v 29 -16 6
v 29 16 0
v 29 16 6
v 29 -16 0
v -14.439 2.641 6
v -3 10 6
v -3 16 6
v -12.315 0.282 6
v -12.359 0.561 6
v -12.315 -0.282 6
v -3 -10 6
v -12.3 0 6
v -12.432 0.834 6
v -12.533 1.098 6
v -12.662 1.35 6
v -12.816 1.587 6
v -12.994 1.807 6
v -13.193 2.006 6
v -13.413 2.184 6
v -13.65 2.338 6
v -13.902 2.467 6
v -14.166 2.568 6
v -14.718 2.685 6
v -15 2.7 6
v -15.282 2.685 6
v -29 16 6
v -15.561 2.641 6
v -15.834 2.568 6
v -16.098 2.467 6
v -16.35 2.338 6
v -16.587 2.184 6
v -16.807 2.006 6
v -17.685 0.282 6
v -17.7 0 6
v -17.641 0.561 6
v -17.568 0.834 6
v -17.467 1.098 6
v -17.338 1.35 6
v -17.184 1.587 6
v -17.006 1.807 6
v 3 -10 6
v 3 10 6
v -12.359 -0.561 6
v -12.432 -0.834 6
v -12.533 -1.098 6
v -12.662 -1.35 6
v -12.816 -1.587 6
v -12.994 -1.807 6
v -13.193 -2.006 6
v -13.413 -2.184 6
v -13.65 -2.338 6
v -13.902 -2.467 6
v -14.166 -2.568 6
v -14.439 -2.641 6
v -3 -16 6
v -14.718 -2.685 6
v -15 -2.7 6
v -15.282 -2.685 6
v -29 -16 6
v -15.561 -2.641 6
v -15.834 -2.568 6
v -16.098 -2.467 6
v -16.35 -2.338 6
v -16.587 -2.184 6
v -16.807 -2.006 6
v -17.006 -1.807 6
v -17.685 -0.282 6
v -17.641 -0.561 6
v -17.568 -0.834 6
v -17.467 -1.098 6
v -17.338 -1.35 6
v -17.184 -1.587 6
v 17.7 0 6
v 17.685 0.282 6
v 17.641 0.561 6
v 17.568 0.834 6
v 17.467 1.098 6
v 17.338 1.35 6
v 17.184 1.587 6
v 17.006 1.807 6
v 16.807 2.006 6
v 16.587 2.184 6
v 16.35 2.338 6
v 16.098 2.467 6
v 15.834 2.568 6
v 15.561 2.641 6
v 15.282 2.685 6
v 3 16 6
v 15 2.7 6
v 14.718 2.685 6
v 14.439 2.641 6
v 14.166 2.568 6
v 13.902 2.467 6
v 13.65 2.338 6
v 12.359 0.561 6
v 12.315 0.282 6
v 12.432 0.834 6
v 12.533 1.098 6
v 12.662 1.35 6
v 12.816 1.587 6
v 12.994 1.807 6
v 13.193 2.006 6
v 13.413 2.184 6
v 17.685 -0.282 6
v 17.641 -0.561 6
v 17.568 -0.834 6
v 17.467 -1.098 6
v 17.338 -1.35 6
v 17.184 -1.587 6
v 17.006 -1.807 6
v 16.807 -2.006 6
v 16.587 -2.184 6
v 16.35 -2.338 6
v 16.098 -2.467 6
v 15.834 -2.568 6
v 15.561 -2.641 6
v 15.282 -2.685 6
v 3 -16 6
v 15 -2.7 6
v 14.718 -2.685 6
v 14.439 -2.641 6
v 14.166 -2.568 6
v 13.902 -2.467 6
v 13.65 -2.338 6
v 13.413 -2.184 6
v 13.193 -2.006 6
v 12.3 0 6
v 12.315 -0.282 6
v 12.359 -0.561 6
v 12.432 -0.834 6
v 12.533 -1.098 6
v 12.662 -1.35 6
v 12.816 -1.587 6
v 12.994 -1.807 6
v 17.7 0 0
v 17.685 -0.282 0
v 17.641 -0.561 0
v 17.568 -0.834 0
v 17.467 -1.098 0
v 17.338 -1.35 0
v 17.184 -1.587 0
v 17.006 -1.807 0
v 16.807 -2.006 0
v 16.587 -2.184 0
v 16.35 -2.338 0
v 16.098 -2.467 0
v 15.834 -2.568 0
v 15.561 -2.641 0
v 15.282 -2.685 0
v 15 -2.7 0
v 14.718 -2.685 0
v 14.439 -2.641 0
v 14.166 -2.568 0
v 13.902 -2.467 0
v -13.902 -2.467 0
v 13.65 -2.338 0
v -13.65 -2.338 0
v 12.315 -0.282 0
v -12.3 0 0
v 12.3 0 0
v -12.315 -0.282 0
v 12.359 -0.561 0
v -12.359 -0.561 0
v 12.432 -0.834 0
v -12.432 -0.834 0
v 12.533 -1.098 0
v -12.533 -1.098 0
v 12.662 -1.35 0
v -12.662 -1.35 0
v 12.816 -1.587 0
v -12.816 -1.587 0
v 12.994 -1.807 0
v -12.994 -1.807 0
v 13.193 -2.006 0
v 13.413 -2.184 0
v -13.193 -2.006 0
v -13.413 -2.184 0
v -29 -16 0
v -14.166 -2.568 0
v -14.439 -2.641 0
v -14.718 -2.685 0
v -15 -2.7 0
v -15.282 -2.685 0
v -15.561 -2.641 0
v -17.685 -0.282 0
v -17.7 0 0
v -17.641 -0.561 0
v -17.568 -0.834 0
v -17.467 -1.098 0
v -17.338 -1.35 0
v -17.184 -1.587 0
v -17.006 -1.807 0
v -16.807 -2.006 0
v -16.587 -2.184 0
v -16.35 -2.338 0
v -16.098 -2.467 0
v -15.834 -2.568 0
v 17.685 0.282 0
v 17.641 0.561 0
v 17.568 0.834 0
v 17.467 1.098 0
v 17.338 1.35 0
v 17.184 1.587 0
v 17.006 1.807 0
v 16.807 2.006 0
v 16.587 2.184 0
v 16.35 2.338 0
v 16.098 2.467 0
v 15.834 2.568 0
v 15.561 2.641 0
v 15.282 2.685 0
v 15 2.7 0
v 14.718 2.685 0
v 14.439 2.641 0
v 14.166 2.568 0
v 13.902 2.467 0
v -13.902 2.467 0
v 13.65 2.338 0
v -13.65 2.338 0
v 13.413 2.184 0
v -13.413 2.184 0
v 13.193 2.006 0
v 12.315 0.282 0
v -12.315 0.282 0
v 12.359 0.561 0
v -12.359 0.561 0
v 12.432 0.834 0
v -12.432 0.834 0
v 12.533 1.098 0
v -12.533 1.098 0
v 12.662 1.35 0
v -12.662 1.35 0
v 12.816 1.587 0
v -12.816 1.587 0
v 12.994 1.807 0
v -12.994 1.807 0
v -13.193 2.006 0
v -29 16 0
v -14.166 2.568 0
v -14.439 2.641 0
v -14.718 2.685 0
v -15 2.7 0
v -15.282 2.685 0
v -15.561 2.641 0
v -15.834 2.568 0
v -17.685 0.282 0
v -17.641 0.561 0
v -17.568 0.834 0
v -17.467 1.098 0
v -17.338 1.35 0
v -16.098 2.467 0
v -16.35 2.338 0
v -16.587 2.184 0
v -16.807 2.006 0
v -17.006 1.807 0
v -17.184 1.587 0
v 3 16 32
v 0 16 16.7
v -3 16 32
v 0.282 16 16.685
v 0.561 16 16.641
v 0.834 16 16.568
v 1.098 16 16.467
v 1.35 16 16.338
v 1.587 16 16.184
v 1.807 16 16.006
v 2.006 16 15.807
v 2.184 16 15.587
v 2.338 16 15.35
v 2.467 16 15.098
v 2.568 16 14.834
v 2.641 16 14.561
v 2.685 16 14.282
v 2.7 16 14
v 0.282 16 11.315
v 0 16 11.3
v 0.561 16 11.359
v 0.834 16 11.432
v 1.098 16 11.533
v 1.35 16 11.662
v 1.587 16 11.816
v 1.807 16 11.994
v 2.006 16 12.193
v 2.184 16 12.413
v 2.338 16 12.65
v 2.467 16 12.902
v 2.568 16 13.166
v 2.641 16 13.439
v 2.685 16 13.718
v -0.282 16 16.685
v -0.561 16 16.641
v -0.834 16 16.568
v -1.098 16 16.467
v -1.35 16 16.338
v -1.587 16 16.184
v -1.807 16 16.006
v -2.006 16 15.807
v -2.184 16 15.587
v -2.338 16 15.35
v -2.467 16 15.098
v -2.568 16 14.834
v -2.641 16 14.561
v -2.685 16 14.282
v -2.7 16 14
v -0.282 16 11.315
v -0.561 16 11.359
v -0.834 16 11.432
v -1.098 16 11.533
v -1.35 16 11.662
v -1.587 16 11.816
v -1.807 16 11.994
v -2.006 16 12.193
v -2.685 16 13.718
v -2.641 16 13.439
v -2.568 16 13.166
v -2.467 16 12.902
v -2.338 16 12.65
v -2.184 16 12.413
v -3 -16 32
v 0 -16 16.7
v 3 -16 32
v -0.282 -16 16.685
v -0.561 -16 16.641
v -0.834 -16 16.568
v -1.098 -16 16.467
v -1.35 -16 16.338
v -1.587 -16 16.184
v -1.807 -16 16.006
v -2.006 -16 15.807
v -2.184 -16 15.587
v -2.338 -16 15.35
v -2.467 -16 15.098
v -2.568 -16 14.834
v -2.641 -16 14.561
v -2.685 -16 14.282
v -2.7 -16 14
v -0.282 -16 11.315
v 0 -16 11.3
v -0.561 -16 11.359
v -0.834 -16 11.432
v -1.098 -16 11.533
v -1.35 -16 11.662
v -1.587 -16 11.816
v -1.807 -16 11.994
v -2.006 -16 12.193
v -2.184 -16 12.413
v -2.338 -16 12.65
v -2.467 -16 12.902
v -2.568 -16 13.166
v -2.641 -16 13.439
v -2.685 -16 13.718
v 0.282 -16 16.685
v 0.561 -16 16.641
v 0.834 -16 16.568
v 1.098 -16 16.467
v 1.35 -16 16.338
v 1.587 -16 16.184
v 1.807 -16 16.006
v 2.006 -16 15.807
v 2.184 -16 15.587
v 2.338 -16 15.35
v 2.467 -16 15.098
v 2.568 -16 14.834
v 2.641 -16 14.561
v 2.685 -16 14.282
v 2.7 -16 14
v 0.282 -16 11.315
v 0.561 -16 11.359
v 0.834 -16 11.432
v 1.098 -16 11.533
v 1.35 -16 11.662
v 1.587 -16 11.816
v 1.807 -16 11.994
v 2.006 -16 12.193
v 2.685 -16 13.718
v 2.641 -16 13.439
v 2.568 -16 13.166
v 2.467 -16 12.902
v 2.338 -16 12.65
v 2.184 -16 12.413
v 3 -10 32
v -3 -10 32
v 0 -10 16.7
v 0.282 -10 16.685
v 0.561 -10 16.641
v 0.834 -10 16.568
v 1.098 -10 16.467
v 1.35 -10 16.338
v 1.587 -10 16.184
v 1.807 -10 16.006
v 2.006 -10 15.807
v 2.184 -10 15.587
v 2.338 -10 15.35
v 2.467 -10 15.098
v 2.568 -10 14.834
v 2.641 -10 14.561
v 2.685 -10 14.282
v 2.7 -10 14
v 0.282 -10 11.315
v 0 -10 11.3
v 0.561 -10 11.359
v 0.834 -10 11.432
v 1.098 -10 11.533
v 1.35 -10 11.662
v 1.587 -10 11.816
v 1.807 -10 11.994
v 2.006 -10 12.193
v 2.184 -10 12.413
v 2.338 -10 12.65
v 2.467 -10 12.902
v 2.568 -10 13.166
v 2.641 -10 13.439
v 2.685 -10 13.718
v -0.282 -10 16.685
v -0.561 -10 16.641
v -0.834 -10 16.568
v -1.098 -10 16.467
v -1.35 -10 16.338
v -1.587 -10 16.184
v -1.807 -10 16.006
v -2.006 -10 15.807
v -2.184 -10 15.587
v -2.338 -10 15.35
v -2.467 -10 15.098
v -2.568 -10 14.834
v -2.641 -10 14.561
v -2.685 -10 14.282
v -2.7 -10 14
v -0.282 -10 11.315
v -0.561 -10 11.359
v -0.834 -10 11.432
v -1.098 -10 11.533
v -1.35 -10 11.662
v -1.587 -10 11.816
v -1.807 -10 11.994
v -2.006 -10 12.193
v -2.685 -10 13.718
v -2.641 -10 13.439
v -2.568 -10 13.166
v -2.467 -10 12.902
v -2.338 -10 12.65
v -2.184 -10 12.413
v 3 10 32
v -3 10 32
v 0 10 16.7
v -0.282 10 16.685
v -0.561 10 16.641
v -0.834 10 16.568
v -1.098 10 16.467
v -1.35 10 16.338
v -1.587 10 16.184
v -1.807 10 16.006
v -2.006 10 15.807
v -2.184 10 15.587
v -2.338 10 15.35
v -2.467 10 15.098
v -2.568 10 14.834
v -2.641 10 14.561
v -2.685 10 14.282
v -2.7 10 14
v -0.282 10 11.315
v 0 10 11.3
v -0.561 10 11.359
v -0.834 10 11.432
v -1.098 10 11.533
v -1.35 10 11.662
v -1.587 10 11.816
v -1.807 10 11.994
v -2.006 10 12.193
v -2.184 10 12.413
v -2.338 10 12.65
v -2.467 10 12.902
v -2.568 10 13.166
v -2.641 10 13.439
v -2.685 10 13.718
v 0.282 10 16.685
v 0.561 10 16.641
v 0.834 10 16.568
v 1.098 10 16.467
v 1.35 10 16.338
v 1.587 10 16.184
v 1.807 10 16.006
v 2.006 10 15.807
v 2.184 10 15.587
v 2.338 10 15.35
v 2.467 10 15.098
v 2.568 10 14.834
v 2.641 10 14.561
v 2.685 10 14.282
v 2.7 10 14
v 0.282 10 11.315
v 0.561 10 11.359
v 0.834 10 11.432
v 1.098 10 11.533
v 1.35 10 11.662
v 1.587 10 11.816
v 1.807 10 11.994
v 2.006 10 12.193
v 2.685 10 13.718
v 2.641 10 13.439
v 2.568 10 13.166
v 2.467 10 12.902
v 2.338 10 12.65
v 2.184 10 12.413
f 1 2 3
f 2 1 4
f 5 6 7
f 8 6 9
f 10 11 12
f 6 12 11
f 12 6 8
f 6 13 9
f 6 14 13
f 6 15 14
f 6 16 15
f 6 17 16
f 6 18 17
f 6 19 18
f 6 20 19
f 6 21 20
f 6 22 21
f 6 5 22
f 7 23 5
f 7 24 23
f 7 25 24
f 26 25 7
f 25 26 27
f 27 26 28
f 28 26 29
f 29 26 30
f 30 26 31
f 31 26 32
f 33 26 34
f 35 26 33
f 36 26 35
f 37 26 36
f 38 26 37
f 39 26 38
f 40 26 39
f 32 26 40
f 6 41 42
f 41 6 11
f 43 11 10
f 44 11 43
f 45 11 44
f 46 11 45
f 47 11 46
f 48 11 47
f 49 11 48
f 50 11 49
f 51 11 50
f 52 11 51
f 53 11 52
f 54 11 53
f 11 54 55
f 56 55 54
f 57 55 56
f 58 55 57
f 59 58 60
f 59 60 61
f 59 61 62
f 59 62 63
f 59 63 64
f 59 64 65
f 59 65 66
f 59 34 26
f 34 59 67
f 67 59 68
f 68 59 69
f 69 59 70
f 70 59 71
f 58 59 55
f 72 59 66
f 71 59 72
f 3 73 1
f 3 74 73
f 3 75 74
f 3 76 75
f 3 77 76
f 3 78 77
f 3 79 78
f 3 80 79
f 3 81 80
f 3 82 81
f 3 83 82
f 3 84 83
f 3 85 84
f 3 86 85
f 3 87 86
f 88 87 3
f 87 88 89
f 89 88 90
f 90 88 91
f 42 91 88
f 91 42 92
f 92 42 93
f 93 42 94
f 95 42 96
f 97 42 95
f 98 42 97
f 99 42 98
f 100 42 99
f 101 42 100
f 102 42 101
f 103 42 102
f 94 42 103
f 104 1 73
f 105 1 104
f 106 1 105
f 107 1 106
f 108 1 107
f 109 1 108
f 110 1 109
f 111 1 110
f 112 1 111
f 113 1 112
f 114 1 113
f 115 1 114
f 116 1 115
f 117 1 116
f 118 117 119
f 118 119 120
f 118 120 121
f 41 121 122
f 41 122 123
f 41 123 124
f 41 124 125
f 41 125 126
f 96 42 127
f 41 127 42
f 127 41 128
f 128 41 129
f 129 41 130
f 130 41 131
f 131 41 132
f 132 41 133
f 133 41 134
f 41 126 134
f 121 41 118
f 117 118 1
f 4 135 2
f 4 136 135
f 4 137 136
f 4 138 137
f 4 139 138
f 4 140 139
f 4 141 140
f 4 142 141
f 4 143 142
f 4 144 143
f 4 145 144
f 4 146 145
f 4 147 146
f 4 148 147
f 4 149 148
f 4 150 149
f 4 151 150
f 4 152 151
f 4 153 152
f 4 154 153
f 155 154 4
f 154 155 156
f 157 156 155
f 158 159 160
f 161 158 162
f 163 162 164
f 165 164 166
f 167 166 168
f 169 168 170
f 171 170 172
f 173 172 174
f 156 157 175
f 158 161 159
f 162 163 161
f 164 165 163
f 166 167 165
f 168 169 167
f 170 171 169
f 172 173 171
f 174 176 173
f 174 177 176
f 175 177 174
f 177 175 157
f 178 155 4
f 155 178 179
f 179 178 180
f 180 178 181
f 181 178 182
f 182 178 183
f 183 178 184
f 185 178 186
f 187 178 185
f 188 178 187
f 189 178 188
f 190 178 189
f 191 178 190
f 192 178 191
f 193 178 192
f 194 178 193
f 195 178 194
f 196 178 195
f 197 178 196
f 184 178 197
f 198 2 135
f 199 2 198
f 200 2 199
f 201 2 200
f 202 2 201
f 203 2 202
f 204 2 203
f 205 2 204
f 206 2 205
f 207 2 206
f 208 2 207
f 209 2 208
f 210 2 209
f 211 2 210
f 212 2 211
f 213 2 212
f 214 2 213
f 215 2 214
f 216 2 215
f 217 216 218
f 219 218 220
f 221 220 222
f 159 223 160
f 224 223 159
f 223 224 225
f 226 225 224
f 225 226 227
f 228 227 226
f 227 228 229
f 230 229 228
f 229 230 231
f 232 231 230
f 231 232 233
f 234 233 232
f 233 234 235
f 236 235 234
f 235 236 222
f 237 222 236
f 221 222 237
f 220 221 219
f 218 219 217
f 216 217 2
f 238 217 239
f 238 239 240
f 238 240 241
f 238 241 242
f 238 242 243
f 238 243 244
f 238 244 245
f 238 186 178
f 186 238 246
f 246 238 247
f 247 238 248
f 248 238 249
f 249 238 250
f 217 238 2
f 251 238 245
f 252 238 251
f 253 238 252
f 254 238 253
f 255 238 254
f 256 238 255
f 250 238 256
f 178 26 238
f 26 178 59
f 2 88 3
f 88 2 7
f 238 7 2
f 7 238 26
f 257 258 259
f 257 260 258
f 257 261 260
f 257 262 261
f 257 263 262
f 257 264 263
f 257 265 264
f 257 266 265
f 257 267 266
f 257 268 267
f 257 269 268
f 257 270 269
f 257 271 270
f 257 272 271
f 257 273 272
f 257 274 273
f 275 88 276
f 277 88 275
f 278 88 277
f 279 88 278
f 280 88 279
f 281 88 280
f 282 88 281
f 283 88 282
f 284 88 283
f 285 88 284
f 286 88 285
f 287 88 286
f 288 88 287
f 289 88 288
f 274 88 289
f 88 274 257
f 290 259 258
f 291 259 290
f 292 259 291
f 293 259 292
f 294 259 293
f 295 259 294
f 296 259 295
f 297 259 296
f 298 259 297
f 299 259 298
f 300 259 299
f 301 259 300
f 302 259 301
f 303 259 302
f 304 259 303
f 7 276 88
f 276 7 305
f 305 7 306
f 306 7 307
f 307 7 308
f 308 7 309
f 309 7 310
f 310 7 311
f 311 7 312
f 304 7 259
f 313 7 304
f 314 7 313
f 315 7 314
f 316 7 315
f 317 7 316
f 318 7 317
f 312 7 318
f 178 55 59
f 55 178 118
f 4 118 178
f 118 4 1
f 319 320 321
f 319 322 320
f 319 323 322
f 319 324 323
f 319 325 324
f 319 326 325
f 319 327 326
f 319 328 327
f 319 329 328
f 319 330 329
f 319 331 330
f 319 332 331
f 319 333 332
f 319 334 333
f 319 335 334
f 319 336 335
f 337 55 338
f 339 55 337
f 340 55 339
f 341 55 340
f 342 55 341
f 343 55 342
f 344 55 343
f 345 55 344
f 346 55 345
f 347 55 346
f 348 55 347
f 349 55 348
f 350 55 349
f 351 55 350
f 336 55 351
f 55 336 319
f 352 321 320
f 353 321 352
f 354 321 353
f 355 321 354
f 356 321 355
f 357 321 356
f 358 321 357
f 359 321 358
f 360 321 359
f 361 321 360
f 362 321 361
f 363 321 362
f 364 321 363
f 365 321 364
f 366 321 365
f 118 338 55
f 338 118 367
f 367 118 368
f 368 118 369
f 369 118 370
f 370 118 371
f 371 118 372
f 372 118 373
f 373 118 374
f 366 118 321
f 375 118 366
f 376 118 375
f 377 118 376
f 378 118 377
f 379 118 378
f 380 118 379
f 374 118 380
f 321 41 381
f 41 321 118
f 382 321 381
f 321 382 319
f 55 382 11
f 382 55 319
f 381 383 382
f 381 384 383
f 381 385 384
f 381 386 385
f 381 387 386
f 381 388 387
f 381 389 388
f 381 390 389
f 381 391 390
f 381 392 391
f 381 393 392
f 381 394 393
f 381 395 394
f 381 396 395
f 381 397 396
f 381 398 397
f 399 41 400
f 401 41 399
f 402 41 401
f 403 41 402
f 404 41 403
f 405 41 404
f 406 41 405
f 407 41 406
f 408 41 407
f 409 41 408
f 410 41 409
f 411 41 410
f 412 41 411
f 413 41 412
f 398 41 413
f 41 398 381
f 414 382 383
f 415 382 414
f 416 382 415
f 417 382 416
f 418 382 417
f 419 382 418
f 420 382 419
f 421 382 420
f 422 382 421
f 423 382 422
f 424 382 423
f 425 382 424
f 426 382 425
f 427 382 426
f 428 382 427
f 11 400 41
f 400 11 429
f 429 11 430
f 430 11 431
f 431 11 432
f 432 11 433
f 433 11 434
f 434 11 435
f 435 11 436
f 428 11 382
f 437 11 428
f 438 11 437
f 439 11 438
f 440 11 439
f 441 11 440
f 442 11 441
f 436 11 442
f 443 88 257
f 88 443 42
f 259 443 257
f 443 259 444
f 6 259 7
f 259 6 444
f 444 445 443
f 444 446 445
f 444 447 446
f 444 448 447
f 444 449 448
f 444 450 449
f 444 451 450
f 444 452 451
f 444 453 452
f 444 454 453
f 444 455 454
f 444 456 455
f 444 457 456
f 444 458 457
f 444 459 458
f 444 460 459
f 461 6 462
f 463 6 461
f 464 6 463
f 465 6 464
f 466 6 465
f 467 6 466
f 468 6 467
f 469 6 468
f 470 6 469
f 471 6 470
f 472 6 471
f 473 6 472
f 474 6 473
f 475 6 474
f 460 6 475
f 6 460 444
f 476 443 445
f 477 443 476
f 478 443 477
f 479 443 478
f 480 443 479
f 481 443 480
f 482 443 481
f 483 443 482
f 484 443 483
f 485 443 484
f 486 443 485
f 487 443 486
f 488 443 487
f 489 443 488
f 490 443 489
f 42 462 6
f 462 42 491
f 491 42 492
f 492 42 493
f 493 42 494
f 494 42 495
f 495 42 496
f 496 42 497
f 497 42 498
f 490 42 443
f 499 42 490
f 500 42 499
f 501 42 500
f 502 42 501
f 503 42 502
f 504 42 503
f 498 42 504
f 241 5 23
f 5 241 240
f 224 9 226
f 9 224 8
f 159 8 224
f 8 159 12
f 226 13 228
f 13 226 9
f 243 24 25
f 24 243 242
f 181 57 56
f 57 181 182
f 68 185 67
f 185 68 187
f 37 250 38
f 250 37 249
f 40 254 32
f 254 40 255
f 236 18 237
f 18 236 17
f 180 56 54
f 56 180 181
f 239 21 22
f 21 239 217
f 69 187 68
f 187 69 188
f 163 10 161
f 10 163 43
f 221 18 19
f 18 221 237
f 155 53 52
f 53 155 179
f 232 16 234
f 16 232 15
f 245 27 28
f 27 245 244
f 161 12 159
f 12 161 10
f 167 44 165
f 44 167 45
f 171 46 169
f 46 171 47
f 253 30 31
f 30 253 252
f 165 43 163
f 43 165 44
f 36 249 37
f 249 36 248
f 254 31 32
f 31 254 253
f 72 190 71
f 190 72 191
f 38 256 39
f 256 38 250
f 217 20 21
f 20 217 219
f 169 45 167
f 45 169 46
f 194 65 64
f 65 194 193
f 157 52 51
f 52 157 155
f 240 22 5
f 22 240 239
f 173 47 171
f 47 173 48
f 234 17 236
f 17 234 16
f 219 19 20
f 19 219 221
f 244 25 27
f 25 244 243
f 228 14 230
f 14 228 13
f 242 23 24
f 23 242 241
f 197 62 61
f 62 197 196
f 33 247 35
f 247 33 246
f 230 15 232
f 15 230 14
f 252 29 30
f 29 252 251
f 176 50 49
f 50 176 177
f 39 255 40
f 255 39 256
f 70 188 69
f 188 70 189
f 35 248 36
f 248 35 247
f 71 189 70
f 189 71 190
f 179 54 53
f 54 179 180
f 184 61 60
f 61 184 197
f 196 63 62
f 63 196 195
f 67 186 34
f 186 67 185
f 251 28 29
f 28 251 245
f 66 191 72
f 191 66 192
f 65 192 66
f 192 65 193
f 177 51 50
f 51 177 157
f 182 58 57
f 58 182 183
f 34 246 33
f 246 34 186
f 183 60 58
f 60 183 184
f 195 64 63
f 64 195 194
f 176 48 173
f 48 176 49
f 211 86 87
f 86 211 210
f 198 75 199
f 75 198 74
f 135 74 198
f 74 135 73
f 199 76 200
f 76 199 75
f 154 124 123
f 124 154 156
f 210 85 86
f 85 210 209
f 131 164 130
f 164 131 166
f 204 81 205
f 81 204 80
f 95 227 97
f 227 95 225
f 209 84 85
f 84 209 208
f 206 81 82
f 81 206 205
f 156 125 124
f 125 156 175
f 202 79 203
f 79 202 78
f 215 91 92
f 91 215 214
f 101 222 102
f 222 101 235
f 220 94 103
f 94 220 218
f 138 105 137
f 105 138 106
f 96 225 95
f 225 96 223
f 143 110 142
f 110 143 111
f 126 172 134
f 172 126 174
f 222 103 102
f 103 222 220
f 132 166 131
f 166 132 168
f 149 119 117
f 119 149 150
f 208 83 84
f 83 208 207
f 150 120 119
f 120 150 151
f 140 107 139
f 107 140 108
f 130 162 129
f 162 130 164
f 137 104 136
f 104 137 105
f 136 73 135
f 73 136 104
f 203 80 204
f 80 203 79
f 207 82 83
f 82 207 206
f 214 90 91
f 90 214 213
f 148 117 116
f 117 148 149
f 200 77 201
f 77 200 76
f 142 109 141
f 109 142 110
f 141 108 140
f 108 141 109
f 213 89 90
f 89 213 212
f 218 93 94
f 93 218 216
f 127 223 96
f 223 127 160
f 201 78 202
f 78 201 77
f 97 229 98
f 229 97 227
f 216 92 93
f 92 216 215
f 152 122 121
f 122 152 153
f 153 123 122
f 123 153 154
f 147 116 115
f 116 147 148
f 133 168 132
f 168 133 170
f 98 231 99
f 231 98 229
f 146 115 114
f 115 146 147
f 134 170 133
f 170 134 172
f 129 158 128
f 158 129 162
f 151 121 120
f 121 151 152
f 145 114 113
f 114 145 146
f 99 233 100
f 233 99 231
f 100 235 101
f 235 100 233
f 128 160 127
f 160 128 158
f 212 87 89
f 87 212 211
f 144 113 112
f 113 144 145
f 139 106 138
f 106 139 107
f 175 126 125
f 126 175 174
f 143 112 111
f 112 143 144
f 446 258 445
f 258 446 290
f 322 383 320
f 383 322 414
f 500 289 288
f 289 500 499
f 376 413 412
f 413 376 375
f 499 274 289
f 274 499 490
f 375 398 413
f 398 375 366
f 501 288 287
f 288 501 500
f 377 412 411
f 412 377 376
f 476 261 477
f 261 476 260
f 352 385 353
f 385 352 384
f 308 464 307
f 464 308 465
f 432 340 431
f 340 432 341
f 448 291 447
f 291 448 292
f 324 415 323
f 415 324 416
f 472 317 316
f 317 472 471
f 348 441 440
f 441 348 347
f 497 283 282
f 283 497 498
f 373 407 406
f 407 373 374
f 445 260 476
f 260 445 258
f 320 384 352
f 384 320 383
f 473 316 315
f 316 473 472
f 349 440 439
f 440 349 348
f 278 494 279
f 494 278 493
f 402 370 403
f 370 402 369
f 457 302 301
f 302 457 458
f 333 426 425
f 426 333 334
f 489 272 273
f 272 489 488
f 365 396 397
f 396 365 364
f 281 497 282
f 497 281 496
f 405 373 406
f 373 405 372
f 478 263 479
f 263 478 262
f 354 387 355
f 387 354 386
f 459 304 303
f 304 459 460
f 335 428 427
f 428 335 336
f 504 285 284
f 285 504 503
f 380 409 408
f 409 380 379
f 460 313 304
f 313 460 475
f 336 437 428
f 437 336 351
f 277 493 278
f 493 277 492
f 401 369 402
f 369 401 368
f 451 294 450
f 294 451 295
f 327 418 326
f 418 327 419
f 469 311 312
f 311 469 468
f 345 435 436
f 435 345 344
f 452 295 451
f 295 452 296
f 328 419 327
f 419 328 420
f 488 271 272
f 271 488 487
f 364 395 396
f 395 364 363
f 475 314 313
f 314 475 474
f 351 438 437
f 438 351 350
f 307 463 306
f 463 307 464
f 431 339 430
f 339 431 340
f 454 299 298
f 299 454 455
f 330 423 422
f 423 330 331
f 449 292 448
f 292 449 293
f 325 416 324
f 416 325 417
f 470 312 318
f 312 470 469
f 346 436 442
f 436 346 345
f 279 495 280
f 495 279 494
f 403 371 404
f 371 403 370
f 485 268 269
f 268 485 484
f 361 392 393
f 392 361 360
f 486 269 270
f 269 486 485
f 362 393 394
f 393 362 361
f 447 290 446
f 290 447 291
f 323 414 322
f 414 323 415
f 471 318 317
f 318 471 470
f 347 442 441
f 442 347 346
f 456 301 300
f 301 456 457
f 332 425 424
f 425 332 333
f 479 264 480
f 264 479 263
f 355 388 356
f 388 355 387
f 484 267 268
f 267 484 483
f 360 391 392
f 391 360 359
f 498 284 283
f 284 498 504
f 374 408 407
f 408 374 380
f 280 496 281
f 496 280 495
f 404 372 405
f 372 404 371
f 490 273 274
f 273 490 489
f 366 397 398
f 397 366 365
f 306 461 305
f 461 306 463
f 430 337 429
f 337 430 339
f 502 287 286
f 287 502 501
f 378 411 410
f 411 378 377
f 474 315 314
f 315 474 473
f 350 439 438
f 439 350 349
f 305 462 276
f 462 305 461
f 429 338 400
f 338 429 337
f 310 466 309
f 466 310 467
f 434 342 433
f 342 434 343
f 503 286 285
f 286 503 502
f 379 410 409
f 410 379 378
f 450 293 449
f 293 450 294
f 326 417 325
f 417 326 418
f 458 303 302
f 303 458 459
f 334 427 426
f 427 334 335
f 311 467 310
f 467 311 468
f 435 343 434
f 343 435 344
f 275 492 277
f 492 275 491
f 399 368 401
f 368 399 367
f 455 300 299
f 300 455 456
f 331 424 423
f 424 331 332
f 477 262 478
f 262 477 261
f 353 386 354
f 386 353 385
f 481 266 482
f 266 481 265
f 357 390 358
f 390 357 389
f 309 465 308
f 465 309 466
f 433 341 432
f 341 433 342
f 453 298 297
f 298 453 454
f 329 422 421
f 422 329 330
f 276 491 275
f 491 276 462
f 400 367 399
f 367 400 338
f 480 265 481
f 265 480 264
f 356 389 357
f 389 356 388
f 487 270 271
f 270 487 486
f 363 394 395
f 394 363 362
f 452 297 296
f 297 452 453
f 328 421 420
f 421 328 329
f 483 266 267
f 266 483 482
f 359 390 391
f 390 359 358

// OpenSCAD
// Clevis mounting bracket for M5 pin.
$fn = 60;
eps = 0.02;
opening = 20;
ear_h = 28;
base_l = 58;
base_w = opening + 12;
base_t = 6;
ear_t = 6;
difference() {
    union() {
        translate([-base_l / 2, -base_w / 2, 0]) cube([base_l, base_w, base_t]);
        translate([-ear_t / 2, -base_w / 2, base_t - 2]) cube([ear_t, ear_t, ear_h]);
        translate([-ear_t / 2, base_w / 2 - ear_t, base_t - 2]) cube([ear_t, ear_t, ear_h]);
    }
    for (x = [-15, 15]) translate([x, 0, -eps]) cylinder(d = 5.4, h = base_t + 2 * eps);
    translate([0, -base_w / 2 - eps, ear_h / 2]) rotate([-90, 0, 0]) cylinder(d = 5.4, h = base_w + 2 * eps);
}
